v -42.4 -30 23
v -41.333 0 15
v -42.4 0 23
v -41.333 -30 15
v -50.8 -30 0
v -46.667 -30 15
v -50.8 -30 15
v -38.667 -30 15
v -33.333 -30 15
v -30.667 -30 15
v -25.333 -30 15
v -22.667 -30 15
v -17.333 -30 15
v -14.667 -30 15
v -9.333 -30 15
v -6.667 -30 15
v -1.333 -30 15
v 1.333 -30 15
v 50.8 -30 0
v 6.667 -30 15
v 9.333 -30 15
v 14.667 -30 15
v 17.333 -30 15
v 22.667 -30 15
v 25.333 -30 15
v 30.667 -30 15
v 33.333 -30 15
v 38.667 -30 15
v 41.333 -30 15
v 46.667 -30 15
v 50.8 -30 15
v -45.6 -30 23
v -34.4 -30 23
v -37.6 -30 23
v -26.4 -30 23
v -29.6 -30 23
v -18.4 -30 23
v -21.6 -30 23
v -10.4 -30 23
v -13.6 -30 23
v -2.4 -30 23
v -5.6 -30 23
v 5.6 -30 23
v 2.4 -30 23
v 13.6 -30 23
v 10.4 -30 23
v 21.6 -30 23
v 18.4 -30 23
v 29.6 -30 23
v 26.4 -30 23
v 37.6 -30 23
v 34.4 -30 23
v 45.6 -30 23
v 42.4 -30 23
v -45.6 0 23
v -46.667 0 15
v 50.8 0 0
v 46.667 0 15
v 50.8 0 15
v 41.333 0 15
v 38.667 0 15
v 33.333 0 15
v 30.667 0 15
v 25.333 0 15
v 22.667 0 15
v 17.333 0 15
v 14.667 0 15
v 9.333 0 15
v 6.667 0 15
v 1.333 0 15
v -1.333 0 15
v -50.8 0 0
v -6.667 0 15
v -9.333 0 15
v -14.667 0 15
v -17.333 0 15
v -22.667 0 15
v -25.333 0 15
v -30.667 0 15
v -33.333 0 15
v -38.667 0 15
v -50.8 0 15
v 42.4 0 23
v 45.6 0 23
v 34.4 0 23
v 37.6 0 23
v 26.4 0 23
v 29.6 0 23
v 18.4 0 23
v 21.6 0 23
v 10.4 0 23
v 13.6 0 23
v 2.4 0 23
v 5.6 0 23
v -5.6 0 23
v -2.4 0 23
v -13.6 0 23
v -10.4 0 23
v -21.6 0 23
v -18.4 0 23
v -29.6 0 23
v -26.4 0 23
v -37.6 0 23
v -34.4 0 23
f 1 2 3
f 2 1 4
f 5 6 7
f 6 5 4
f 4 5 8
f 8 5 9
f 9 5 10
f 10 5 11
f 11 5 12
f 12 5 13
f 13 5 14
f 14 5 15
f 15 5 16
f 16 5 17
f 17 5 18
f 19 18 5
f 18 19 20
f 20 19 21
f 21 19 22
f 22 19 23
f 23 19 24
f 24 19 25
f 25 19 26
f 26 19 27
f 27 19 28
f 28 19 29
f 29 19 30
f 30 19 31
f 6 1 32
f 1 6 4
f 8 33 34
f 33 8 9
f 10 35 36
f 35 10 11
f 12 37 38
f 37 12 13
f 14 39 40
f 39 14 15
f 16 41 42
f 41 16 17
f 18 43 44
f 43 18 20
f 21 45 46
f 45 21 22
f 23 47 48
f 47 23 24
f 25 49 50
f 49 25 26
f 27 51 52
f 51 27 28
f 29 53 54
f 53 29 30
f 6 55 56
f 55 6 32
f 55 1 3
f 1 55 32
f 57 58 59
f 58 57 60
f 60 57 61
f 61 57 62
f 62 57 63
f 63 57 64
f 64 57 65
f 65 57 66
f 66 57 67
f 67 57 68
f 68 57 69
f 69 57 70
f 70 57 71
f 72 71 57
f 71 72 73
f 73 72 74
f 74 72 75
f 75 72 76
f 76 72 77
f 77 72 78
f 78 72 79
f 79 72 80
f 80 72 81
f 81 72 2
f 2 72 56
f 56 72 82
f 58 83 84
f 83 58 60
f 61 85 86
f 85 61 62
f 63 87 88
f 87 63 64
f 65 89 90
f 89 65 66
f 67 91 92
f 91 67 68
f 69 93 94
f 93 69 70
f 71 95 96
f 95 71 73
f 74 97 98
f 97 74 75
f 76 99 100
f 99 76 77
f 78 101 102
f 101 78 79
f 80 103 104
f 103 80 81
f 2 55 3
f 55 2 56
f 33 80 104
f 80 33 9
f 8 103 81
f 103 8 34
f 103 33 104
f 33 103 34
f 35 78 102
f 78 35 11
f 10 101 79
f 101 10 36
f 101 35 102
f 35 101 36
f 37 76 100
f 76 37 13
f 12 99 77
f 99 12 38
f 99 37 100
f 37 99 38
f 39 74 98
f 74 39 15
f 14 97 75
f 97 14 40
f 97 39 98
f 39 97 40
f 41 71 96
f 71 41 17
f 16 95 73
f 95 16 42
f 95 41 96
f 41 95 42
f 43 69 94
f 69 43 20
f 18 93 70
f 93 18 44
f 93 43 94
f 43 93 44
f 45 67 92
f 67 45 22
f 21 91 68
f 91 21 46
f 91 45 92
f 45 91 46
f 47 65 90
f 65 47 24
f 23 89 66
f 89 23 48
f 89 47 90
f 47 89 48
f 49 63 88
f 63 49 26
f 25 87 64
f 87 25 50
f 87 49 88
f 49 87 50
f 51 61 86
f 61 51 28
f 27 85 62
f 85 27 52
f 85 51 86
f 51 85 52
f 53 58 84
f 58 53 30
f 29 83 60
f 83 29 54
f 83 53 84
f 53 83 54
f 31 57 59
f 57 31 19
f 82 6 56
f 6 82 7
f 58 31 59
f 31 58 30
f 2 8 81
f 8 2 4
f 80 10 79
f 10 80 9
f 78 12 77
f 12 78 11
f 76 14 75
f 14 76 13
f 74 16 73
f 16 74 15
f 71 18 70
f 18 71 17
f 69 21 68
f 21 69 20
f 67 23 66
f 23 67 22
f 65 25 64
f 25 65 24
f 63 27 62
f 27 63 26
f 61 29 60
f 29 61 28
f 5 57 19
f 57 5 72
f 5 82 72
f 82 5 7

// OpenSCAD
$fn = 32;

// ----------------------------------------------------------------------
// Toothed rack, 12 teeth
// 8 mm pitch, 8 mm teeth
// ----------------------------------------------------------------------

// --- parameters (mm) ---
bar_w = 30;     // bar width (Y)
bar_h = 15;     // bar height (Z)
teeth = 12;     // number of teeth
pitch = 8;      // tooth pitch
tooth_h = 8;    // tooth height above the bar
root_w = 5.6;   // tooth width at the root
crest_w = 3.2;  // tooth width at the crest

// --- derived feature positions (mm) ---
span = (teeth - 1) * pitch;  // = 88   distance between the outer teeth
bar_l = span + root_w + 8;   // = 101.6   bar length: teeth plus 4 mm at each end
tooth_x = -span / 2;         // = -44   X of the first tooth
height = bar_h + tooth_h;    // = 23   overall height
feature_centers = [
  [tooth_x + 0 * pitch, -bar_w / 2],
  [tooth_x + 1 * pitch, -bar_w / 2],
  [tooth_x + 2 * pitch, -bar_w / 2],
  [tooth_x + 3 * pitch, -bar_w / 2],
  [tooth_x + 4 * pitch, -bar_w / 2],
  [tooth_x + 5 * pitch, -bar_w / 2],
  [tooth_x + 6 * pitch, -bar_w / 2],
  [tooth_x + 7 * pitch, -bar_w / 2],
  [tooth_x + 8 * pitch, -bar_w / 2],
  [tooth_x + 9 * pitch, -bar_w / 2],
  [tooth_x + 10 * pitch, -bar_w / 2],
  [tooth_x + 11 * pitch, -bar_w / 2]
];   // tooth centre line, drives the tooth loop

// bar with a rack of teeth, one extruded trapezoium per centre
module rack_tooth() {
  linear_extrude(height = bar_w)
    polygon(points = [
      [0, 0],
      [root_w, 0],
      [root_w / 2 + crest_w / 2, tooth_h + 1],
      [root_w / 2 - crest_w / 2, tooth_h + 1]
    ]);
}

union() {
  translate([-bar_l / 2, -bar_w, 0]) cube([bar_l, bar_w, bar_h]);
  for (centre = feature_centers)
    translate([centre[0] - root_w / 2, 0, bar_h - 1]) rotate([90, 0, 0]) rack_tooth();
}
